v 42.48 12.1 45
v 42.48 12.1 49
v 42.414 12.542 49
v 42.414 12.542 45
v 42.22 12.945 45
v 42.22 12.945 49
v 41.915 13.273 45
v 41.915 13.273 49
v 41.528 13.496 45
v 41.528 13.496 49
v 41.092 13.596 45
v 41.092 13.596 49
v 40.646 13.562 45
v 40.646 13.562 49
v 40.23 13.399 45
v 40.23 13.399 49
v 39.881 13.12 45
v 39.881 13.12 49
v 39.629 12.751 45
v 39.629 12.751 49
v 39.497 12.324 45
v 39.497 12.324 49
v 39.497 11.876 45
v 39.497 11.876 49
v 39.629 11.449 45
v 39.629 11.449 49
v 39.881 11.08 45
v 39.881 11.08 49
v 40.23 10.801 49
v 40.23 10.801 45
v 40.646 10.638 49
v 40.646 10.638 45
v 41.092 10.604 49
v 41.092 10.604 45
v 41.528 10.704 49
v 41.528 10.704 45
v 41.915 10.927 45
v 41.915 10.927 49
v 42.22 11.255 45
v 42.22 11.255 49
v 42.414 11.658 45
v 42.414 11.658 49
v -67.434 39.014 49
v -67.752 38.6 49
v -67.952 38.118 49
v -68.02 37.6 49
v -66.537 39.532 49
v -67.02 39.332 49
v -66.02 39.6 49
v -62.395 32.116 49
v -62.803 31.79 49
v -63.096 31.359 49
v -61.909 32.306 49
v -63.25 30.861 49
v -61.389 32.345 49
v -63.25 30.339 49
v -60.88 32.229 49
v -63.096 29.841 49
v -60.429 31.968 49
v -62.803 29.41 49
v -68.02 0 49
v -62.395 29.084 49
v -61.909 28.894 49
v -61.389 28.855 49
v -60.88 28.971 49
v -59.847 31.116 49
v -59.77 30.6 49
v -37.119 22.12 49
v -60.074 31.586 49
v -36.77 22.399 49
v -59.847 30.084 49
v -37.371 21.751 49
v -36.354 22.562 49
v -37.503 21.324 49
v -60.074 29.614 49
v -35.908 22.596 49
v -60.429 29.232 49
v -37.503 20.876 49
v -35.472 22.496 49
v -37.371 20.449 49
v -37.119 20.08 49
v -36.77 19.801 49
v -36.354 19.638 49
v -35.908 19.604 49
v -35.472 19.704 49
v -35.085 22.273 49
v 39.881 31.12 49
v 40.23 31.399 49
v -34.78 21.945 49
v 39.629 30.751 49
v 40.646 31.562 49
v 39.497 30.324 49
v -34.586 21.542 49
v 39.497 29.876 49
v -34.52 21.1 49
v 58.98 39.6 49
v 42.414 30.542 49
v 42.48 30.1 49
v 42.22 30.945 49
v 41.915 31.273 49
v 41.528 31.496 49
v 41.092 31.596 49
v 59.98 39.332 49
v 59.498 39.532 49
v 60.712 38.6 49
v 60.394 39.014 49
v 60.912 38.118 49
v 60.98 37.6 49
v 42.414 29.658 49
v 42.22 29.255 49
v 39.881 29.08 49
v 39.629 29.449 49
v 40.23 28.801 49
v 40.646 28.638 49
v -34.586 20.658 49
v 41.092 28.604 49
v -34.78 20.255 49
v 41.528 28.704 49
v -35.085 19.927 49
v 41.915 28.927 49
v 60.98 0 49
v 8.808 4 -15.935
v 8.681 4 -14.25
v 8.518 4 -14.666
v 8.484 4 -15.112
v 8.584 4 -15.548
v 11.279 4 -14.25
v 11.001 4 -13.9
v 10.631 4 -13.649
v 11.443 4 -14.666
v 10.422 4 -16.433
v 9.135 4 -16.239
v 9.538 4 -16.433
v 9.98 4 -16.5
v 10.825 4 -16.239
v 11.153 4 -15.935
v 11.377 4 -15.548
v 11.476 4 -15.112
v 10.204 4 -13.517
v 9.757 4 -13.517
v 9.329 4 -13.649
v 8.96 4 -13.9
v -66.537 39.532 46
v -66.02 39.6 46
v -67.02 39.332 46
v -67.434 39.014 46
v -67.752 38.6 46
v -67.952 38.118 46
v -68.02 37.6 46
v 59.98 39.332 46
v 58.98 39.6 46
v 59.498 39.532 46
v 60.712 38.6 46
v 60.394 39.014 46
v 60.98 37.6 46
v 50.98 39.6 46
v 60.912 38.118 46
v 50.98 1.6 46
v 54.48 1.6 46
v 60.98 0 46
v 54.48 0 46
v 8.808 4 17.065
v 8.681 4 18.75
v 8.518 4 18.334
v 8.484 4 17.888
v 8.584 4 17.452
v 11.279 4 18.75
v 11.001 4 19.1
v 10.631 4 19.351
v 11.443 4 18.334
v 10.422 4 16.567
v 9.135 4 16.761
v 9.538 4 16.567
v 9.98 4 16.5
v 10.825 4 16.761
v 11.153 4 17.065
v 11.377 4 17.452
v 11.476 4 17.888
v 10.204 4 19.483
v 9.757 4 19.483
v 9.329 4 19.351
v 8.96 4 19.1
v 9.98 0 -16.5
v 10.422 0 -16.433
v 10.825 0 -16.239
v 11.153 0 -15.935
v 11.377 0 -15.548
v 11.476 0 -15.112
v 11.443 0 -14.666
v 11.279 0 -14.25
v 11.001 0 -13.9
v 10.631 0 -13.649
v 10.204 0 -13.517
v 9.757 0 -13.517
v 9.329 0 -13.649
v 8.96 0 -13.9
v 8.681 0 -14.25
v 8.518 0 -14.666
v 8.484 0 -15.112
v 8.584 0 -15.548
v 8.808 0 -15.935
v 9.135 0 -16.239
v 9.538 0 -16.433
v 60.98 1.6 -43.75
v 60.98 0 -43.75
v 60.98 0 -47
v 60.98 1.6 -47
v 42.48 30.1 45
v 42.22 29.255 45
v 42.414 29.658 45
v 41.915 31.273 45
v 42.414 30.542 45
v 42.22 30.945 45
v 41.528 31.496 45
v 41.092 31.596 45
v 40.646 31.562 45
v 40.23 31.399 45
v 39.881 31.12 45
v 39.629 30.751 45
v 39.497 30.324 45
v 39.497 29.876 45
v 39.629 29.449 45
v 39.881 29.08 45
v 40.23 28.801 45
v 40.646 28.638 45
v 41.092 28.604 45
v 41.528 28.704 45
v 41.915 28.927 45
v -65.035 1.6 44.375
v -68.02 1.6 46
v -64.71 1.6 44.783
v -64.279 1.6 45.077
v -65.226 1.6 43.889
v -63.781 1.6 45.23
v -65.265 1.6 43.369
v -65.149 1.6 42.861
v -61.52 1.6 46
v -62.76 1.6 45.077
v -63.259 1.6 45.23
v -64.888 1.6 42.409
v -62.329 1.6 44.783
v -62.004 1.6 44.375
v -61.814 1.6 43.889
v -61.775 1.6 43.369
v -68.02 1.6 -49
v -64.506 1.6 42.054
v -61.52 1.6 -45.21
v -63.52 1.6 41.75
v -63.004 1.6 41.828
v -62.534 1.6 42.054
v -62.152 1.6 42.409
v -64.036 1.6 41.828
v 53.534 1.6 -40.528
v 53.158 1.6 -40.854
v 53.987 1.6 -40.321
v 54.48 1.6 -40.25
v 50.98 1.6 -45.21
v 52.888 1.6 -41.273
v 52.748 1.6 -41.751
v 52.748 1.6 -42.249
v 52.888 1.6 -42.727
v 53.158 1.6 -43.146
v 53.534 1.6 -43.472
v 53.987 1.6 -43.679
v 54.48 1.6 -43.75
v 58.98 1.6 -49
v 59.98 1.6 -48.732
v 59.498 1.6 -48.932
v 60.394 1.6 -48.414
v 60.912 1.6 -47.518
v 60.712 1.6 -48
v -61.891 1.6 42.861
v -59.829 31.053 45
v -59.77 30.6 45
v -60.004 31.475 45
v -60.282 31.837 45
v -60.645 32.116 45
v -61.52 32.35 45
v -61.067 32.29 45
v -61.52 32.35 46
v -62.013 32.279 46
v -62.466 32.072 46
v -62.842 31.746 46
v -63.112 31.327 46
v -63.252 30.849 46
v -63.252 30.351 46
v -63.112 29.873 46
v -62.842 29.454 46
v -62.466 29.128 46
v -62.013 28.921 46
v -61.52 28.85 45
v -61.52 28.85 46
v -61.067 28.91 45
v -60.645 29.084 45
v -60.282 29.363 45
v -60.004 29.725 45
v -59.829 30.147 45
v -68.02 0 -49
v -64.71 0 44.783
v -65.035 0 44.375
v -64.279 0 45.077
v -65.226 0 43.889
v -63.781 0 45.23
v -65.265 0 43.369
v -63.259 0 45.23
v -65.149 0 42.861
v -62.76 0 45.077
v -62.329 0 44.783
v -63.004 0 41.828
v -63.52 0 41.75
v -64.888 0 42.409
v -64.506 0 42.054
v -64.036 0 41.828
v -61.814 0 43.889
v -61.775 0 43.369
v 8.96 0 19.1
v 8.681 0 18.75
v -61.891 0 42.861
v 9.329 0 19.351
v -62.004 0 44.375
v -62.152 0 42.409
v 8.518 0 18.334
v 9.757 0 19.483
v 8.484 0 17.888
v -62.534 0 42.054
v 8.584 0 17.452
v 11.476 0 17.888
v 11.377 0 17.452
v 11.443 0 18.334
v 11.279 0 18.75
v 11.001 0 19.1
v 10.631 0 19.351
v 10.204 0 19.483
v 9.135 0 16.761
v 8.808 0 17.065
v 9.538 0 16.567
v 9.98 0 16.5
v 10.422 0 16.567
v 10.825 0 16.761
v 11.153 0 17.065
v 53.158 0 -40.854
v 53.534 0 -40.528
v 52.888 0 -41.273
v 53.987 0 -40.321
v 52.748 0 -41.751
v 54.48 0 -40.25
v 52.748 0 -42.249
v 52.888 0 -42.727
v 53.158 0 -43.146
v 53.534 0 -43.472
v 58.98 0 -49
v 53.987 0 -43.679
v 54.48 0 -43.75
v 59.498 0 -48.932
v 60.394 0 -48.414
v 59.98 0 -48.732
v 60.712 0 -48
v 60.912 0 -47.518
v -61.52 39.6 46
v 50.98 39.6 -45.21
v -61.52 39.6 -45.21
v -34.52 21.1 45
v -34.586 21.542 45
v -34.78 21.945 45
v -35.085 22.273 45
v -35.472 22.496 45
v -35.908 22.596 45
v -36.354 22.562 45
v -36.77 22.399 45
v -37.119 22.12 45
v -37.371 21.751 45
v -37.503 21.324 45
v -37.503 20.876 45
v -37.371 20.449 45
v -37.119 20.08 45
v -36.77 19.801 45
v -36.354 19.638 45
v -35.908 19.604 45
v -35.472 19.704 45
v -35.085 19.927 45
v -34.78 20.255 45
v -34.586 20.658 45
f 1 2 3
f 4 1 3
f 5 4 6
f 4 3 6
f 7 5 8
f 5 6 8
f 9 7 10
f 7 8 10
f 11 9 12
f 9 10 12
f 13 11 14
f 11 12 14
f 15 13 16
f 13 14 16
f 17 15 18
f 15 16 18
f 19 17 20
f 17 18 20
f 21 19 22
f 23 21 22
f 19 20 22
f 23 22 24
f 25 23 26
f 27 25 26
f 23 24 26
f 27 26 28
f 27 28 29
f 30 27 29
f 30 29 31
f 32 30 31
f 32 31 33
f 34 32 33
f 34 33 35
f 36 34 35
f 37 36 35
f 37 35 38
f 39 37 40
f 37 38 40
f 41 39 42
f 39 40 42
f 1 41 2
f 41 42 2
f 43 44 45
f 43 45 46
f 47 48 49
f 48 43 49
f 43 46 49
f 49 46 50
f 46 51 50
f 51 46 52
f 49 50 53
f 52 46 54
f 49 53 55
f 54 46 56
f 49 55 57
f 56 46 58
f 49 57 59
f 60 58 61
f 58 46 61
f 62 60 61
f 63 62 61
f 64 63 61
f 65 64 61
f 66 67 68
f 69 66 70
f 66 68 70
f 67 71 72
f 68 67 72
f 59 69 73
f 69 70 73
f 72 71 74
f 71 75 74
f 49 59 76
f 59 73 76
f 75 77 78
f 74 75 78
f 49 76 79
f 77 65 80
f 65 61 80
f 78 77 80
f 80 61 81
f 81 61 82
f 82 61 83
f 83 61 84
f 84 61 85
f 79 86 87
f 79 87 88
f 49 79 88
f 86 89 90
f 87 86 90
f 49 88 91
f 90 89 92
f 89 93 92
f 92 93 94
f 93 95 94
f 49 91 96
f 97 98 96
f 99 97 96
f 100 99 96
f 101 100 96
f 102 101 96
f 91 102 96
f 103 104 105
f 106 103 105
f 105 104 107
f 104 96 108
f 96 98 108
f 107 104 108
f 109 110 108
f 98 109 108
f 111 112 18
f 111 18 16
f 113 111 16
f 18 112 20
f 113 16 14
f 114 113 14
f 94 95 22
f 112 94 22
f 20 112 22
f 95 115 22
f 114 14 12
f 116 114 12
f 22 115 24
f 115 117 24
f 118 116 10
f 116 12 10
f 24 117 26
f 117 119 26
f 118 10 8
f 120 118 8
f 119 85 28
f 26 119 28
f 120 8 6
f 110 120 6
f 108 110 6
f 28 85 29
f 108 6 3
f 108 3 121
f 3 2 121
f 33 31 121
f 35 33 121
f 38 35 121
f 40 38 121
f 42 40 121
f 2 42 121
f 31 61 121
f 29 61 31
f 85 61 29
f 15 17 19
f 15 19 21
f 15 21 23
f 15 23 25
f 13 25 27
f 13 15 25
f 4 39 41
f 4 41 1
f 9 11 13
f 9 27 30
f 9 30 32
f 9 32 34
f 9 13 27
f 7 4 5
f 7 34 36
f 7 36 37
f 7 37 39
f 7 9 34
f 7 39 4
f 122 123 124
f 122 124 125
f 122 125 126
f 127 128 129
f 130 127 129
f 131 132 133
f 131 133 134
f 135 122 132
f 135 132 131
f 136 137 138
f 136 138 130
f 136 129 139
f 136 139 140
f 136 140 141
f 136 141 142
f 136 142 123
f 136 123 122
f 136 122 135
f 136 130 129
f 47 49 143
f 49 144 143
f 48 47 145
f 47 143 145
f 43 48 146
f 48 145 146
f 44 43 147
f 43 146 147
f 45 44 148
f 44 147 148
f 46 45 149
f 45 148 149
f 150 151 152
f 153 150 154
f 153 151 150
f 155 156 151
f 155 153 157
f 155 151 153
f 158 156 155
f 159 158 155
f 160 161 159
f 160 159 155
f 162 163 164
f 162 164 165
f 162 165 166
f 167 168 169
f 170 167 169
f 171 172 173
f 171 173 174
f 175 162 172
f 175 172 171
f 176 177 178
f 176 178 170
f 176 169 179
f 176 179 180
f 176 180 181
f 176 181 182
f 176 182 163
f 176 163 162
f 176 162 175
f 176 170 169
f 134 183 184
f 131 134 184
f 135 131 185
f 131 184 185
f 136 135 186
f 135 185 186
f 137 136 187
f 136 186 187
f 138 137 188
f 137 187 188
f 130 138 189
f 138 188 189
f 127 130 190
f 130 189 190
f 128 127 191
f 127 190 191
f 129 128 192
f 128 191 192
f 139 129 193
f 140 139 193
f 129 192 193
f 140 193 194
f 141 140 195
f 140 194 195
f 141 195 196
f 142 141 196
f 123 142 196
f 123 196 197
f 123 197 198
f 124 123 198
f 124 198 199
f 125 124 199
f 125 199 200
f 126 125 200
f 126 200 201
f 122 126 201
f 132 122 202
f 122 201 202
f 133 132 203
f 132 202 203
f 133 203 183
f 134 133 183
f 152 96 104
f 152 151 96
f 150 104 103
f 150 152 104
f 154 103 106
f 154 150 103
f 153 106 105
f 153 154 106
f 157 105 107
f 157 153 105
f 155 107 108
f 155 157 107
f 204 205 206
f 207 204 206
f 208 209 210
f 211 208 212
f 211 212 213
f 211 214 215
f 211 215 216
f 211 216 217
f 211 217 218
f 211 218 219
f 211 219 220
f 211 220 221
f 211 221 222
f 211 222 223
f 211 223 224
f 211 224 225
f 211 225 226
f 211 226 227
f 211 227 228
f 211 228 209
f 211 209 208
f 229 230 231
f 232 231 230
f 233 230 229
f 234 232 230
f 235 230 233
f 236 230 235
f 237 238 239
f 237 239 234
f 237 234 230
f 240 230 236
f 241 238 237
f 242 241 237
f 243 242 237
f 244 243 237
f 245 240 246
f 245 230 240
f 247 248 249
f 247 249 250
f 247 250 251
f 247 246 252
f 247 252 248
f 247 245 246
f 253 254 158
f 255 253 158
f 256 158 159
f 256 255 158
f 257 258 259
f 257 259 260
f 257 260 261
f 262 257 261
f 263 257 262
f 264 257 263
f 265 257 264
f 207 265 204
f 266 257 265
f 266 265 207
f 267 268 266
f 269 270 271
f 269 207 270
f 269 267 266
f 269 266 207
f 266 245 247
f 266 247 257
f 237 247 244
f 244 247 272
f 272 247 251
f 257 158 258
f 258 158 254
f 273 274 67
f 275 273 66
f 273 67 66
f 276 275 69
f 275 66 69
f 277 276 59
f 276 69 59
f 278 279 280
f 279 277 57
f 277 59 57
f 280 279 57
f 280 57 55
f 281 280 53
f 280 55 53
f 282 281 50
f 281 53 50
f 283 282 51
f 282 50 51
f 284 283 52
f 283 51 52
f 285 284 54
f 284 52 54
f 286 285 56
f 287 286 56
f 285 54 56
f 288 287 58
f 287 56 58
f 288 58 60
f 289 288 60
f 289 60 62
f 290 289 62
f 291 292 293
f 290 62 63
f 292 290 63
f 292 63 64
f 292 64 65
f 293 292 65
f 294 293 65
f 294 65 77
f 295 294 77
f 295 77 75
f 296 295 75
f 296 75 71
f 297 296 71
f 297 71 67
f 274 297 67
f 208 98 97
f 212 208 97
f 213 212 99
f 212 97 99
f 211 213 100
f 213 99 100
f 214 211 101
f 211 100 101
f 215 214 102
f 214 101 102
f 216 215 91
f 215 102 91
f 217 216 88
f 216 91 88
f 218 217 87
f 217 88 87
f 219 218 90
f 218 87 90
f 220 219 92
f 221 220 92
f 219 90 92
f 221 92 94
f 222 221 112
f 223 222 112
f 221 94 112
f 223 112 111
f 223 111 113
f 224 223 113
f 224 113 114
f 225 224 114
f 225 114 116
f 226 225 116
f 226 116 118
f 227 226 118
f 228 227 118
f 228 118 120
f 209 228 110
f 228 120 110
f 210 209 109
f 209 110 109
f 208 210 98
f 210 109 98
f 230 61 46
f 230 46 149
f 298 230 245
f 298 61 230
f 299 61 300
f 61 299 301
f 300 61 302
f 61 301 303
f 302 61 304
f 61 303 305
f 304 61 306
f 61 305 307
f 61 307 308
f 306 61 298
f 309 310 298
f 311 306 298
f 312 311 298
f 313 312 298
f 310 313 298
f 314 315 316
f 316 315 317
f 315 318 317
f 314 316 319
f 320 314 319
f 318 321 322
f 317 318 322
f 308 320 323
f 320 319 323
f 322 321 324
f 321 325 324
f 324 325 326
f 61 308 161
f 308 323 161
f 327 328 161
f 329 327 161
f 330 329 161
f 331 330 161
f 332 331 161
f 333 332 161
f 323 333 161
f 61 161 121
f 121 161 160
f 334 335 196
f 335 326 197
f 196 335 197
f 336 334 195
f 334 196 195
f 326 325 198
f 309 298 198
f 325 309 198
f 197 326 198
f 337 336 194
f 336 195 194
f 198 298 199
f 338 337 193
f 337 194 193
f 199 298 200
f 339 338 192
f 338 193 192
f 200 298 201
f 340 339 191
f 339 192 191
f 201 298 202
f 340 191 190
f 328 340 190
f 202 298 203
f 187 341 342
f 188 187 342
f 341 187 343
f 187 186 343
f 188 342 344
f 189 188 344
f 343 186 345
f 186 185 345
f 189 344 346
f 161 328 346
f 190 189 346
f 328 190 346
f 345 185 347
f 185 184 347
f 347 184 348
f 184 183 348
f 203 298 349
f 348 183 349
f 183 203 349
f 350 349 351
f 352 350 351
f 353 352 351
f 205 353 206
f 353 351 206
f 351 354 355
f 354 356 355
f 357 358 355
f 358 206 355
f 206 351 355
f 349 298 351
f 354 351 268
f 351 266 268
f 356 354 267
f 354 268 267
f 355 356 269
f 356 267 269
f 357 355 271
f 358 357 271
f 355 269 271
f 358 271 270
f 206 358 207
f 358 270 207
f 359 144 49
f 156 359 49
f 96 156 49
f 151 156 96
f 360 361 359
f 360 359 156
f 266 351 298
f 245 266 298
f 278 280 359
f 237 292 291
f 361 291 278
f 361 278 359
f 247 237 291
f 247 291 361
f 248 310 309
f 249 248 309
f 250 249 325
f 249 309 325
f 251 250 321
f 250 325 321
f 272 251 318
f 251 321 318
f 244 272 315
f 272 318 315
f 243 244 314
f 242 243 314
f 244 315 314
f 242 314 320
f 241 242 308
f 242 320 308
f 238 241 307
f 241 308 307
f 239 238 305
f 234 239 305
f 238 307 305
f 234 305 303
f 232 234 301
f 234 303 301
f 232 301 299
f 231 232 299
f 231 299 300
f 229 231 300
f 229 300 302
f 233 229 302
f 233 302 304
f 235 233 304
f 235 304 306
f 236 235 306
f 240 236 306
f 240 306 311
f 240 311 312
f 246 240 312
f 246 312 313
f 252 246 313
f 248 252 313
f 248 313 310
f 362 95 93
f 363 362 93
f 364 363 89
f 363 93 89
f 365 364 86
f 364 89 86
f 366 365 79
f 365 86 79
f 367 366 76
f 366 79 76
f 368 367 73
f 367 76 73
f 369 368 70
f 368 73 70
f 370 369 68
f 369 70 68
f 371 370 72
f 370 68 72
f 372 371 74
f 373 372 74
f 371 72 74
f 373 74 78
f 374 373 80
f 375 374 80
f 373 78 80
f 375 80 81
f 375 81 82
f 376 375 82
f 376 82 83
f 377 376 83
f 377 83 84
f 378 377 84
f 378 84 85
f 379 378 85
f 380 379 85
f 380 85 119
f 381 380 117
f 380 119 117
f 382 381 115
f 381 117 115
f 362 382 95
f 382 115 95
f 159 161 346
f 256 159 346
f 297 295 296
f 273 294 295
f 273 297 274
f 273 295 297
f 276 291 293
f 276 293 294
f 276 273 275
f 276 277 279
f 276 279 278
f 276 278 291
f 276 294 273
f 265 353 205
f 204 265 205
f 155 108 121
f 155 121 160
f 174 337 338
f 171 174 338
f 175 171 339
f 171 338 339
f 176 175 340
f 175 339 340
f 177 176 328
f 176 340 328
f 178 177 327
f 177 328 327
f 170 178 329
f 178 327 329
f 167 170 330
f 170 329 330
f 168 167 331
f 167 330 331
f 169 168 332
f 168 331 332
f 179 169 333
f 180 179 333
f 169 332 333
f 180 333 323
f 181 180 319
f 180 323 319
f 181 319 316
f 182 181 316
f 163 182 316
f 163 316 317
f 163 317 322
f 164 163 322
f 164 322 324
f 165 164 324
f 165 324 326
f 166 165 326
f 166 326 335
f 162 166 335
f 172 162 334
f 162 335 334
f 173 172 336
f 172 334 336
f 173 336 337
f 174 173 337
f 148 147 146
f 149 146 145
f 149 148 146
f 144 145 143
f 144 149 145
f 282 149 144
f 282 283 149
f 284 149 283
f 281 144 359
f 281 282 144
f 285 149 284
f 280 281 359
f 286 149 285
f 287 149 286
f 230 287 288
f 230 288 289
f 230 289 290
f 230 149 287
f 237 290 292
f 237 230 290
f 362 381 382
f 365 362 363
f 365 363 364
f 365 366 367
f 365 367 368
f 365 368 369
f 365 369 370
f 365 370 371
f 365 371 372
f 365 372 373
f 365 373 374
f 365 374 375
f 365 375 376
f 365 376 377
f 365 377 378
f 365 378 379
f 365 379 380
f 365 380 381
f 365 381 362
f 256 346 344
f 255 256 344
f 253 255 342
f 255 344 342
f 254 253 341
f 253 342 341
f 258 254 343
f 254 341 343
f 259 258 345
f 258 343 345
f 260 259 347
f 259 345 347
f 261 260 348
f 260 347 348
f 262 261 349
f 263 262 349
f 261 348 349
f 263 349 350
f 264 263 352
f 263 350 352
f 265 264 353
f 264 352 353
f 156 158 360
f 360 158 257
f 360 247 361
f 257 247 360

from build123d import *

# Parameters (mm, degrees)
BOSS_EXTRUDE1_DEPTH = 1.6
SKETCH2_W           = 112.5
SKETCH2_H           = 91.209934792
BOSS_EXTRUDE2_DEPTH = 38
SKETCH3_W           = 129
SKETCH3_H           = 3
BOSS_EXTRUDE3_DEPTH = 38
SKETCH4_R           = 1.5
SKETCH4_R_2         = 1.75
CUT_EXTRUDE1_DEPTH  = 4
SKETCH5_R           = 1.75
SKETCH5_R_2         = 1.5
CUT_EXTRUDE2_DEPTH  = 4
FILLET1_R           = 2
FILLET2_R           = 2
FILLET3_R           = 2


with BuildPart() as part:
    # Sketch1 → Boss-Extrude1 (new body)
    with BuildSketch(Plane(origin=(0, 0, 0), x_dir=(1, 0, 0), z_dir=(0, 1, 0))):
        with BuildLine():
            Line((-68.019736842, 49), (-68.019736842, -49))
            Line((-68.019736842, -49), (60.980263158, -49))
            Line((60.980263158, -49), (60.980263158, -46))
            Line((60.980263158, -46), (54.480263158, -46))
            Line((54.480263158, -46), (54.480263158, 40.25))
            ThreePointArc((54.480263158, 40.25), (52.730263158, 42), (54.480263158, 43.75))
            Line((54.480263158, 43.75), (60.980263158, 43.75))
            Line((60.980263158, 43.75), (60.980263158, 49))
            Line((60.980263158, 49), (-68.019736842, 49))
        make_face()
    extrude(amount=BOSS_EXTRUDE1_DEPTH)

    # Sketch2 → Boss-Extrude2 (add)
    with BuildSketch(Plane(origin=(0, 1.6, 0), x_dir=(1, 0, 0), z_dir=(0, 1, 0))):
        with Locations((-5.269736842, -0.395032604)):
            Rectangle(SKETCH2_W, SKETCH2_H)
    extrude(amount=BOSS_EXTRUDE2_DEPTH)

    # Sketch3 → Boss-Extrude3 (add)
    with BuildSketch(Plane(origin=(0, 1.6, 0), x_dir=(1, 0, 0), z_dir=(0, 1, 0))):
        with Locations((-3.519736842, -47.5)):
            Rectangle(SKETCH3_W, SKETCH3_H)
    extrude(amount=BOSS_EXTRUDE3_DEPTH)

    # Sketch4 → Cut-Extrude1 (cut)
    with BuildSketch(Plane.XY.offset(49)):
        with Locations((-36.019736842, 21.1)):
            Circle(SKETCH4_R)
        with Locations((40.980263158, 12.1)):
            Circle(SKETCH4_R)
        with Locations((40.980263158, 30.1)):
            Circle(SKETCH4_R)
        with Locations((-61.519736842, 30.6)):
            Circle(SKETCH4_R_2)
    extrude(amount=-CUT_EXTRUDE1_DEPTH, mode=Mode.SUBTRACT)

    # Sketch5 → Cut-Extrude2 (cut)
    with BuildSketch(Plane.XZ):
        with Locations(Location((-63.519736842, 43.5, 0), (0, 0, 270))):
            Circle(SKETCH5_R)
        with Locations(Location((9.980263158, 18, 0), (0, 0, 270))):
            Circle(SKETCH5_R_2)
        with Locations(Location((9.980263158, -15, 0), (0, 0, 270))):
            Circle(SKETCH5_R_2)
    extrude(amount=-CUT_EXTRUDE2_DEPTH, mode=Mode.SUBTRACT)

    # Fillet1
    fillet1_edges = [part.edges().sort_by_distance(p)[0] for p in [
        (60.980263158, 0.8, -49),
    ]]
    fillet(fillet1_edges, radius=FILLET1_R)

    # Fillet2
    fillet2_edges = [part.edges().sort_by_distance(p)[0] for p in [
        (60.980263158, 39.6, 47.5),
    ]]
    fillet(fillet2_edges, radius=FILLET2_R)

    # Fillet3
    fillet3_edges = [part.edges().sort_by_distance(p)[0] for p in [
        (-68.019736842, 39.6, 47.5),
    ]]
    fillet(fillet3_edges, radius=FILLET3_R)


solid = part.part
